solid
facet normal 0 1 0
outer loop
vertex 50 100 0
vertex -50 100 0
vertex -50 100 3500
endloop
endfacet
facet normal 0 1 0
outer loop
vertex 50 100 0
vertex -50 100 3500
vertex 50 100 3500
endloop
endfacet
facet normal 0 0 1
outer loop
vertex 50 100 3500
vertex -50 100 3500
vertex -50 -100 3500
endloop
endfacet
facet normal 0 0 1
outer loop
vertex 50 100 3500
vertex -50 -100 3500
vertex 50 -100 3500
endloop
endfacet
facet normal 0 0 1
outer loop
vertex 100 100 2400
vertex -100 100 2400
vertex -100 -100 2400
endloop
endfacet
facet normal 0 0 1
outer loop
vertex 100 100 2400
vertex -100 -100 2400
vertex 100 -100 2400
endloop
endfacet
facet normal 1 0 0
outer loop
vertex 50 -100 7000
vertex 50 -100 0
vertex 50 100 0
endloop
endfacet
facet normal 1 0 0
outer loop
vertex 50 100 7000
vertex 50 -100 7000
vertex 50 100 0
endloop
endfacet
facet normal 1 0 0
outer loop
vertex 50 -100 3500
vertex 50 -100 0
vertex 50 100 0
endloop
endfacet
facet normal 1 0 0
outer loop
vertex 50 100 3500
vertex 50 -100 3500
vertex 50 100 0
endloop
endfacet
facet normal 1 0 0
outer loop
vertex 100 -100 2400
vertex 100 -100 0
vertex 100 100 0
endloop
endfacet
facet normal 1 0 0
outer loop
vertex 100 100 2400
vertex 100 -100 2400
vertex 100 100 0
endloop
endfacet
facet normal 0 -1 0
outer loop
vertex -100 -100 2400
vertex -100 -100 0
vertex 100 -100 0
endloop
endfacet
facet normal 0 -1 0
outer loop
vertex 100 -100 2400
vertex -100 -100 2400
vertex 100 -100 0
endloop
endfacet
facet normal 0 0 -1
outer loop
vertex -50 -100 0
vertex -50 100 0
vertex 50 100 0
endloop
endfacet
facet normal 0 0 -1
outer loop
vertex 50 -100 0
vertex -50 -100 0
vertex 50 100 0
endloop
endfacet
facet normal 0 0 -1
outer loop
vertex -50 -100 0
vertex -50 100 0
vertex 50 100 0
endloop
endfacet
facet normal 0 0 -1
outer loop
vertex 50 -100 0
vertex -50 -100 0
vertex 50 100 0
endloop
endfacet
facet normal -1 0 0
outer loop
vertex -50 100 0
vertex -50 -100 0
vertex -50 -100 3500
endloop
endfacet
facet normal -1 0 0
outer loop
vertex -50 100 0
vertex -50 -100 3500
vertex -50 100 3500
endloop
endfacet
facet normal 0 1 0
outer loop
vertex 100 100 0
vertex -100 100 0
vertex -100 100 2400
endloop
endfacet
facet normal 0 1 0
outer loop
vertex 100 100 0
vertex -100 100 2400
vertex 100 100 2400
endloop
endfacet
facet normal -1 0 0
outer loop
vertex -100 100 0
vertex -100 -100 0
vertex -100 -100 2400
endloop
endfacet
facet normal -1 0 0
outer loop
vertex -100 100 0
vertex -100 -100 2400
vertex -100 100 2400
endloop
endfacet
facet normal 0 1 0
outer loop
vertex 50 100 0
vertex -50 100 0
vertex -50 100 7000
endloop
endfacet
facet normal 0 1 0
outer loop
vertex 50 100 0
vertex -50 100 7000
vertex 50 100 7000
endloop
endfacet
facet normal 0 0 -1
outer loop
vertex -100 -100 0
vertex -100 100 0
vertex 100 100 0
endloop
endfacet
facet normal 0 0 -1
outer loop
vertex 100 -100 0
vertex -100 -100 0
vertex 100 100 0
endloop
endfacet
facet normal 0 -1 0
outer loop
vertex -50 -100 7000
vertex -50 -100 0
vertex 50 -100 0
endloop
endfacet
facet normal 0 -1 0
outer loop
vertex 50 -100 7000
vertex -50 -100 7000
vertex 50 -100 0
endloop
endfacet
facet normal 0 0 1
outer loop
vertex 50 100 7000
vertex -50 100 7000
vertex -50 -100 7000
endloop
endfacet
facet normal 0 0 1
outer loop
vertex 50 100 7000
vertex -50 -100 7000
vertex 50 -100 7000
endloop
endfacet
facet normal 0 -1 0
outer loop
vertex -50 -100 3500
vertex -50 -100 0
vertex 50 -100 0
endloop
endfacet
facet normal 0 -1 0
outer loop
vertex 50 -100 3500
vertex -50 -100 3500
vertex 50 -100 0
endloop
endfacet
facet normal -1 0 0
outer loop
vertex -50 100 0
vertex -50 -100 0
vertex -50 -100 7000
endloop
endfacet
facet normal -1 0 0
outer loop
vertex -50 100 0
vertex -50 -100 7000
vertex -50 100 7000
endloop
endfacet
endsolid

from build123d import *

# Parameters (mm, degrees)
F0_W     = 200
F0_H     = 200
F2_DEPTH = 2400
F1_W     = 100
F1_H     = 200
F3_DEPTH = 3500
F4_DEPTH = 7000


with BuildPart() as f2:
    # F0 (on Top) → F2 (new body)
    with BuildSketch(Plane.XY):
        Rectangle(F0_W, F0_H)
    extrude(amount=F2_DEPTH)


with BuildPart() as f3:
    # F1 (on Top) → F3 (new body)
    with BuildSketch(Plane.XY):
        Rectangle(F1_W, F1_H)
    extrude(amount=F3_DEPTH)


with BuildPart() as f4:
    # F1 (on Top) → F4 (new body)
    with BuildSketch(Plane.XY):
        Rectangle(F1_W, F1_H)
    extrude(amount=F4_DEPTH)


solid = Compound([f2.part, f3.part, f4.part])
